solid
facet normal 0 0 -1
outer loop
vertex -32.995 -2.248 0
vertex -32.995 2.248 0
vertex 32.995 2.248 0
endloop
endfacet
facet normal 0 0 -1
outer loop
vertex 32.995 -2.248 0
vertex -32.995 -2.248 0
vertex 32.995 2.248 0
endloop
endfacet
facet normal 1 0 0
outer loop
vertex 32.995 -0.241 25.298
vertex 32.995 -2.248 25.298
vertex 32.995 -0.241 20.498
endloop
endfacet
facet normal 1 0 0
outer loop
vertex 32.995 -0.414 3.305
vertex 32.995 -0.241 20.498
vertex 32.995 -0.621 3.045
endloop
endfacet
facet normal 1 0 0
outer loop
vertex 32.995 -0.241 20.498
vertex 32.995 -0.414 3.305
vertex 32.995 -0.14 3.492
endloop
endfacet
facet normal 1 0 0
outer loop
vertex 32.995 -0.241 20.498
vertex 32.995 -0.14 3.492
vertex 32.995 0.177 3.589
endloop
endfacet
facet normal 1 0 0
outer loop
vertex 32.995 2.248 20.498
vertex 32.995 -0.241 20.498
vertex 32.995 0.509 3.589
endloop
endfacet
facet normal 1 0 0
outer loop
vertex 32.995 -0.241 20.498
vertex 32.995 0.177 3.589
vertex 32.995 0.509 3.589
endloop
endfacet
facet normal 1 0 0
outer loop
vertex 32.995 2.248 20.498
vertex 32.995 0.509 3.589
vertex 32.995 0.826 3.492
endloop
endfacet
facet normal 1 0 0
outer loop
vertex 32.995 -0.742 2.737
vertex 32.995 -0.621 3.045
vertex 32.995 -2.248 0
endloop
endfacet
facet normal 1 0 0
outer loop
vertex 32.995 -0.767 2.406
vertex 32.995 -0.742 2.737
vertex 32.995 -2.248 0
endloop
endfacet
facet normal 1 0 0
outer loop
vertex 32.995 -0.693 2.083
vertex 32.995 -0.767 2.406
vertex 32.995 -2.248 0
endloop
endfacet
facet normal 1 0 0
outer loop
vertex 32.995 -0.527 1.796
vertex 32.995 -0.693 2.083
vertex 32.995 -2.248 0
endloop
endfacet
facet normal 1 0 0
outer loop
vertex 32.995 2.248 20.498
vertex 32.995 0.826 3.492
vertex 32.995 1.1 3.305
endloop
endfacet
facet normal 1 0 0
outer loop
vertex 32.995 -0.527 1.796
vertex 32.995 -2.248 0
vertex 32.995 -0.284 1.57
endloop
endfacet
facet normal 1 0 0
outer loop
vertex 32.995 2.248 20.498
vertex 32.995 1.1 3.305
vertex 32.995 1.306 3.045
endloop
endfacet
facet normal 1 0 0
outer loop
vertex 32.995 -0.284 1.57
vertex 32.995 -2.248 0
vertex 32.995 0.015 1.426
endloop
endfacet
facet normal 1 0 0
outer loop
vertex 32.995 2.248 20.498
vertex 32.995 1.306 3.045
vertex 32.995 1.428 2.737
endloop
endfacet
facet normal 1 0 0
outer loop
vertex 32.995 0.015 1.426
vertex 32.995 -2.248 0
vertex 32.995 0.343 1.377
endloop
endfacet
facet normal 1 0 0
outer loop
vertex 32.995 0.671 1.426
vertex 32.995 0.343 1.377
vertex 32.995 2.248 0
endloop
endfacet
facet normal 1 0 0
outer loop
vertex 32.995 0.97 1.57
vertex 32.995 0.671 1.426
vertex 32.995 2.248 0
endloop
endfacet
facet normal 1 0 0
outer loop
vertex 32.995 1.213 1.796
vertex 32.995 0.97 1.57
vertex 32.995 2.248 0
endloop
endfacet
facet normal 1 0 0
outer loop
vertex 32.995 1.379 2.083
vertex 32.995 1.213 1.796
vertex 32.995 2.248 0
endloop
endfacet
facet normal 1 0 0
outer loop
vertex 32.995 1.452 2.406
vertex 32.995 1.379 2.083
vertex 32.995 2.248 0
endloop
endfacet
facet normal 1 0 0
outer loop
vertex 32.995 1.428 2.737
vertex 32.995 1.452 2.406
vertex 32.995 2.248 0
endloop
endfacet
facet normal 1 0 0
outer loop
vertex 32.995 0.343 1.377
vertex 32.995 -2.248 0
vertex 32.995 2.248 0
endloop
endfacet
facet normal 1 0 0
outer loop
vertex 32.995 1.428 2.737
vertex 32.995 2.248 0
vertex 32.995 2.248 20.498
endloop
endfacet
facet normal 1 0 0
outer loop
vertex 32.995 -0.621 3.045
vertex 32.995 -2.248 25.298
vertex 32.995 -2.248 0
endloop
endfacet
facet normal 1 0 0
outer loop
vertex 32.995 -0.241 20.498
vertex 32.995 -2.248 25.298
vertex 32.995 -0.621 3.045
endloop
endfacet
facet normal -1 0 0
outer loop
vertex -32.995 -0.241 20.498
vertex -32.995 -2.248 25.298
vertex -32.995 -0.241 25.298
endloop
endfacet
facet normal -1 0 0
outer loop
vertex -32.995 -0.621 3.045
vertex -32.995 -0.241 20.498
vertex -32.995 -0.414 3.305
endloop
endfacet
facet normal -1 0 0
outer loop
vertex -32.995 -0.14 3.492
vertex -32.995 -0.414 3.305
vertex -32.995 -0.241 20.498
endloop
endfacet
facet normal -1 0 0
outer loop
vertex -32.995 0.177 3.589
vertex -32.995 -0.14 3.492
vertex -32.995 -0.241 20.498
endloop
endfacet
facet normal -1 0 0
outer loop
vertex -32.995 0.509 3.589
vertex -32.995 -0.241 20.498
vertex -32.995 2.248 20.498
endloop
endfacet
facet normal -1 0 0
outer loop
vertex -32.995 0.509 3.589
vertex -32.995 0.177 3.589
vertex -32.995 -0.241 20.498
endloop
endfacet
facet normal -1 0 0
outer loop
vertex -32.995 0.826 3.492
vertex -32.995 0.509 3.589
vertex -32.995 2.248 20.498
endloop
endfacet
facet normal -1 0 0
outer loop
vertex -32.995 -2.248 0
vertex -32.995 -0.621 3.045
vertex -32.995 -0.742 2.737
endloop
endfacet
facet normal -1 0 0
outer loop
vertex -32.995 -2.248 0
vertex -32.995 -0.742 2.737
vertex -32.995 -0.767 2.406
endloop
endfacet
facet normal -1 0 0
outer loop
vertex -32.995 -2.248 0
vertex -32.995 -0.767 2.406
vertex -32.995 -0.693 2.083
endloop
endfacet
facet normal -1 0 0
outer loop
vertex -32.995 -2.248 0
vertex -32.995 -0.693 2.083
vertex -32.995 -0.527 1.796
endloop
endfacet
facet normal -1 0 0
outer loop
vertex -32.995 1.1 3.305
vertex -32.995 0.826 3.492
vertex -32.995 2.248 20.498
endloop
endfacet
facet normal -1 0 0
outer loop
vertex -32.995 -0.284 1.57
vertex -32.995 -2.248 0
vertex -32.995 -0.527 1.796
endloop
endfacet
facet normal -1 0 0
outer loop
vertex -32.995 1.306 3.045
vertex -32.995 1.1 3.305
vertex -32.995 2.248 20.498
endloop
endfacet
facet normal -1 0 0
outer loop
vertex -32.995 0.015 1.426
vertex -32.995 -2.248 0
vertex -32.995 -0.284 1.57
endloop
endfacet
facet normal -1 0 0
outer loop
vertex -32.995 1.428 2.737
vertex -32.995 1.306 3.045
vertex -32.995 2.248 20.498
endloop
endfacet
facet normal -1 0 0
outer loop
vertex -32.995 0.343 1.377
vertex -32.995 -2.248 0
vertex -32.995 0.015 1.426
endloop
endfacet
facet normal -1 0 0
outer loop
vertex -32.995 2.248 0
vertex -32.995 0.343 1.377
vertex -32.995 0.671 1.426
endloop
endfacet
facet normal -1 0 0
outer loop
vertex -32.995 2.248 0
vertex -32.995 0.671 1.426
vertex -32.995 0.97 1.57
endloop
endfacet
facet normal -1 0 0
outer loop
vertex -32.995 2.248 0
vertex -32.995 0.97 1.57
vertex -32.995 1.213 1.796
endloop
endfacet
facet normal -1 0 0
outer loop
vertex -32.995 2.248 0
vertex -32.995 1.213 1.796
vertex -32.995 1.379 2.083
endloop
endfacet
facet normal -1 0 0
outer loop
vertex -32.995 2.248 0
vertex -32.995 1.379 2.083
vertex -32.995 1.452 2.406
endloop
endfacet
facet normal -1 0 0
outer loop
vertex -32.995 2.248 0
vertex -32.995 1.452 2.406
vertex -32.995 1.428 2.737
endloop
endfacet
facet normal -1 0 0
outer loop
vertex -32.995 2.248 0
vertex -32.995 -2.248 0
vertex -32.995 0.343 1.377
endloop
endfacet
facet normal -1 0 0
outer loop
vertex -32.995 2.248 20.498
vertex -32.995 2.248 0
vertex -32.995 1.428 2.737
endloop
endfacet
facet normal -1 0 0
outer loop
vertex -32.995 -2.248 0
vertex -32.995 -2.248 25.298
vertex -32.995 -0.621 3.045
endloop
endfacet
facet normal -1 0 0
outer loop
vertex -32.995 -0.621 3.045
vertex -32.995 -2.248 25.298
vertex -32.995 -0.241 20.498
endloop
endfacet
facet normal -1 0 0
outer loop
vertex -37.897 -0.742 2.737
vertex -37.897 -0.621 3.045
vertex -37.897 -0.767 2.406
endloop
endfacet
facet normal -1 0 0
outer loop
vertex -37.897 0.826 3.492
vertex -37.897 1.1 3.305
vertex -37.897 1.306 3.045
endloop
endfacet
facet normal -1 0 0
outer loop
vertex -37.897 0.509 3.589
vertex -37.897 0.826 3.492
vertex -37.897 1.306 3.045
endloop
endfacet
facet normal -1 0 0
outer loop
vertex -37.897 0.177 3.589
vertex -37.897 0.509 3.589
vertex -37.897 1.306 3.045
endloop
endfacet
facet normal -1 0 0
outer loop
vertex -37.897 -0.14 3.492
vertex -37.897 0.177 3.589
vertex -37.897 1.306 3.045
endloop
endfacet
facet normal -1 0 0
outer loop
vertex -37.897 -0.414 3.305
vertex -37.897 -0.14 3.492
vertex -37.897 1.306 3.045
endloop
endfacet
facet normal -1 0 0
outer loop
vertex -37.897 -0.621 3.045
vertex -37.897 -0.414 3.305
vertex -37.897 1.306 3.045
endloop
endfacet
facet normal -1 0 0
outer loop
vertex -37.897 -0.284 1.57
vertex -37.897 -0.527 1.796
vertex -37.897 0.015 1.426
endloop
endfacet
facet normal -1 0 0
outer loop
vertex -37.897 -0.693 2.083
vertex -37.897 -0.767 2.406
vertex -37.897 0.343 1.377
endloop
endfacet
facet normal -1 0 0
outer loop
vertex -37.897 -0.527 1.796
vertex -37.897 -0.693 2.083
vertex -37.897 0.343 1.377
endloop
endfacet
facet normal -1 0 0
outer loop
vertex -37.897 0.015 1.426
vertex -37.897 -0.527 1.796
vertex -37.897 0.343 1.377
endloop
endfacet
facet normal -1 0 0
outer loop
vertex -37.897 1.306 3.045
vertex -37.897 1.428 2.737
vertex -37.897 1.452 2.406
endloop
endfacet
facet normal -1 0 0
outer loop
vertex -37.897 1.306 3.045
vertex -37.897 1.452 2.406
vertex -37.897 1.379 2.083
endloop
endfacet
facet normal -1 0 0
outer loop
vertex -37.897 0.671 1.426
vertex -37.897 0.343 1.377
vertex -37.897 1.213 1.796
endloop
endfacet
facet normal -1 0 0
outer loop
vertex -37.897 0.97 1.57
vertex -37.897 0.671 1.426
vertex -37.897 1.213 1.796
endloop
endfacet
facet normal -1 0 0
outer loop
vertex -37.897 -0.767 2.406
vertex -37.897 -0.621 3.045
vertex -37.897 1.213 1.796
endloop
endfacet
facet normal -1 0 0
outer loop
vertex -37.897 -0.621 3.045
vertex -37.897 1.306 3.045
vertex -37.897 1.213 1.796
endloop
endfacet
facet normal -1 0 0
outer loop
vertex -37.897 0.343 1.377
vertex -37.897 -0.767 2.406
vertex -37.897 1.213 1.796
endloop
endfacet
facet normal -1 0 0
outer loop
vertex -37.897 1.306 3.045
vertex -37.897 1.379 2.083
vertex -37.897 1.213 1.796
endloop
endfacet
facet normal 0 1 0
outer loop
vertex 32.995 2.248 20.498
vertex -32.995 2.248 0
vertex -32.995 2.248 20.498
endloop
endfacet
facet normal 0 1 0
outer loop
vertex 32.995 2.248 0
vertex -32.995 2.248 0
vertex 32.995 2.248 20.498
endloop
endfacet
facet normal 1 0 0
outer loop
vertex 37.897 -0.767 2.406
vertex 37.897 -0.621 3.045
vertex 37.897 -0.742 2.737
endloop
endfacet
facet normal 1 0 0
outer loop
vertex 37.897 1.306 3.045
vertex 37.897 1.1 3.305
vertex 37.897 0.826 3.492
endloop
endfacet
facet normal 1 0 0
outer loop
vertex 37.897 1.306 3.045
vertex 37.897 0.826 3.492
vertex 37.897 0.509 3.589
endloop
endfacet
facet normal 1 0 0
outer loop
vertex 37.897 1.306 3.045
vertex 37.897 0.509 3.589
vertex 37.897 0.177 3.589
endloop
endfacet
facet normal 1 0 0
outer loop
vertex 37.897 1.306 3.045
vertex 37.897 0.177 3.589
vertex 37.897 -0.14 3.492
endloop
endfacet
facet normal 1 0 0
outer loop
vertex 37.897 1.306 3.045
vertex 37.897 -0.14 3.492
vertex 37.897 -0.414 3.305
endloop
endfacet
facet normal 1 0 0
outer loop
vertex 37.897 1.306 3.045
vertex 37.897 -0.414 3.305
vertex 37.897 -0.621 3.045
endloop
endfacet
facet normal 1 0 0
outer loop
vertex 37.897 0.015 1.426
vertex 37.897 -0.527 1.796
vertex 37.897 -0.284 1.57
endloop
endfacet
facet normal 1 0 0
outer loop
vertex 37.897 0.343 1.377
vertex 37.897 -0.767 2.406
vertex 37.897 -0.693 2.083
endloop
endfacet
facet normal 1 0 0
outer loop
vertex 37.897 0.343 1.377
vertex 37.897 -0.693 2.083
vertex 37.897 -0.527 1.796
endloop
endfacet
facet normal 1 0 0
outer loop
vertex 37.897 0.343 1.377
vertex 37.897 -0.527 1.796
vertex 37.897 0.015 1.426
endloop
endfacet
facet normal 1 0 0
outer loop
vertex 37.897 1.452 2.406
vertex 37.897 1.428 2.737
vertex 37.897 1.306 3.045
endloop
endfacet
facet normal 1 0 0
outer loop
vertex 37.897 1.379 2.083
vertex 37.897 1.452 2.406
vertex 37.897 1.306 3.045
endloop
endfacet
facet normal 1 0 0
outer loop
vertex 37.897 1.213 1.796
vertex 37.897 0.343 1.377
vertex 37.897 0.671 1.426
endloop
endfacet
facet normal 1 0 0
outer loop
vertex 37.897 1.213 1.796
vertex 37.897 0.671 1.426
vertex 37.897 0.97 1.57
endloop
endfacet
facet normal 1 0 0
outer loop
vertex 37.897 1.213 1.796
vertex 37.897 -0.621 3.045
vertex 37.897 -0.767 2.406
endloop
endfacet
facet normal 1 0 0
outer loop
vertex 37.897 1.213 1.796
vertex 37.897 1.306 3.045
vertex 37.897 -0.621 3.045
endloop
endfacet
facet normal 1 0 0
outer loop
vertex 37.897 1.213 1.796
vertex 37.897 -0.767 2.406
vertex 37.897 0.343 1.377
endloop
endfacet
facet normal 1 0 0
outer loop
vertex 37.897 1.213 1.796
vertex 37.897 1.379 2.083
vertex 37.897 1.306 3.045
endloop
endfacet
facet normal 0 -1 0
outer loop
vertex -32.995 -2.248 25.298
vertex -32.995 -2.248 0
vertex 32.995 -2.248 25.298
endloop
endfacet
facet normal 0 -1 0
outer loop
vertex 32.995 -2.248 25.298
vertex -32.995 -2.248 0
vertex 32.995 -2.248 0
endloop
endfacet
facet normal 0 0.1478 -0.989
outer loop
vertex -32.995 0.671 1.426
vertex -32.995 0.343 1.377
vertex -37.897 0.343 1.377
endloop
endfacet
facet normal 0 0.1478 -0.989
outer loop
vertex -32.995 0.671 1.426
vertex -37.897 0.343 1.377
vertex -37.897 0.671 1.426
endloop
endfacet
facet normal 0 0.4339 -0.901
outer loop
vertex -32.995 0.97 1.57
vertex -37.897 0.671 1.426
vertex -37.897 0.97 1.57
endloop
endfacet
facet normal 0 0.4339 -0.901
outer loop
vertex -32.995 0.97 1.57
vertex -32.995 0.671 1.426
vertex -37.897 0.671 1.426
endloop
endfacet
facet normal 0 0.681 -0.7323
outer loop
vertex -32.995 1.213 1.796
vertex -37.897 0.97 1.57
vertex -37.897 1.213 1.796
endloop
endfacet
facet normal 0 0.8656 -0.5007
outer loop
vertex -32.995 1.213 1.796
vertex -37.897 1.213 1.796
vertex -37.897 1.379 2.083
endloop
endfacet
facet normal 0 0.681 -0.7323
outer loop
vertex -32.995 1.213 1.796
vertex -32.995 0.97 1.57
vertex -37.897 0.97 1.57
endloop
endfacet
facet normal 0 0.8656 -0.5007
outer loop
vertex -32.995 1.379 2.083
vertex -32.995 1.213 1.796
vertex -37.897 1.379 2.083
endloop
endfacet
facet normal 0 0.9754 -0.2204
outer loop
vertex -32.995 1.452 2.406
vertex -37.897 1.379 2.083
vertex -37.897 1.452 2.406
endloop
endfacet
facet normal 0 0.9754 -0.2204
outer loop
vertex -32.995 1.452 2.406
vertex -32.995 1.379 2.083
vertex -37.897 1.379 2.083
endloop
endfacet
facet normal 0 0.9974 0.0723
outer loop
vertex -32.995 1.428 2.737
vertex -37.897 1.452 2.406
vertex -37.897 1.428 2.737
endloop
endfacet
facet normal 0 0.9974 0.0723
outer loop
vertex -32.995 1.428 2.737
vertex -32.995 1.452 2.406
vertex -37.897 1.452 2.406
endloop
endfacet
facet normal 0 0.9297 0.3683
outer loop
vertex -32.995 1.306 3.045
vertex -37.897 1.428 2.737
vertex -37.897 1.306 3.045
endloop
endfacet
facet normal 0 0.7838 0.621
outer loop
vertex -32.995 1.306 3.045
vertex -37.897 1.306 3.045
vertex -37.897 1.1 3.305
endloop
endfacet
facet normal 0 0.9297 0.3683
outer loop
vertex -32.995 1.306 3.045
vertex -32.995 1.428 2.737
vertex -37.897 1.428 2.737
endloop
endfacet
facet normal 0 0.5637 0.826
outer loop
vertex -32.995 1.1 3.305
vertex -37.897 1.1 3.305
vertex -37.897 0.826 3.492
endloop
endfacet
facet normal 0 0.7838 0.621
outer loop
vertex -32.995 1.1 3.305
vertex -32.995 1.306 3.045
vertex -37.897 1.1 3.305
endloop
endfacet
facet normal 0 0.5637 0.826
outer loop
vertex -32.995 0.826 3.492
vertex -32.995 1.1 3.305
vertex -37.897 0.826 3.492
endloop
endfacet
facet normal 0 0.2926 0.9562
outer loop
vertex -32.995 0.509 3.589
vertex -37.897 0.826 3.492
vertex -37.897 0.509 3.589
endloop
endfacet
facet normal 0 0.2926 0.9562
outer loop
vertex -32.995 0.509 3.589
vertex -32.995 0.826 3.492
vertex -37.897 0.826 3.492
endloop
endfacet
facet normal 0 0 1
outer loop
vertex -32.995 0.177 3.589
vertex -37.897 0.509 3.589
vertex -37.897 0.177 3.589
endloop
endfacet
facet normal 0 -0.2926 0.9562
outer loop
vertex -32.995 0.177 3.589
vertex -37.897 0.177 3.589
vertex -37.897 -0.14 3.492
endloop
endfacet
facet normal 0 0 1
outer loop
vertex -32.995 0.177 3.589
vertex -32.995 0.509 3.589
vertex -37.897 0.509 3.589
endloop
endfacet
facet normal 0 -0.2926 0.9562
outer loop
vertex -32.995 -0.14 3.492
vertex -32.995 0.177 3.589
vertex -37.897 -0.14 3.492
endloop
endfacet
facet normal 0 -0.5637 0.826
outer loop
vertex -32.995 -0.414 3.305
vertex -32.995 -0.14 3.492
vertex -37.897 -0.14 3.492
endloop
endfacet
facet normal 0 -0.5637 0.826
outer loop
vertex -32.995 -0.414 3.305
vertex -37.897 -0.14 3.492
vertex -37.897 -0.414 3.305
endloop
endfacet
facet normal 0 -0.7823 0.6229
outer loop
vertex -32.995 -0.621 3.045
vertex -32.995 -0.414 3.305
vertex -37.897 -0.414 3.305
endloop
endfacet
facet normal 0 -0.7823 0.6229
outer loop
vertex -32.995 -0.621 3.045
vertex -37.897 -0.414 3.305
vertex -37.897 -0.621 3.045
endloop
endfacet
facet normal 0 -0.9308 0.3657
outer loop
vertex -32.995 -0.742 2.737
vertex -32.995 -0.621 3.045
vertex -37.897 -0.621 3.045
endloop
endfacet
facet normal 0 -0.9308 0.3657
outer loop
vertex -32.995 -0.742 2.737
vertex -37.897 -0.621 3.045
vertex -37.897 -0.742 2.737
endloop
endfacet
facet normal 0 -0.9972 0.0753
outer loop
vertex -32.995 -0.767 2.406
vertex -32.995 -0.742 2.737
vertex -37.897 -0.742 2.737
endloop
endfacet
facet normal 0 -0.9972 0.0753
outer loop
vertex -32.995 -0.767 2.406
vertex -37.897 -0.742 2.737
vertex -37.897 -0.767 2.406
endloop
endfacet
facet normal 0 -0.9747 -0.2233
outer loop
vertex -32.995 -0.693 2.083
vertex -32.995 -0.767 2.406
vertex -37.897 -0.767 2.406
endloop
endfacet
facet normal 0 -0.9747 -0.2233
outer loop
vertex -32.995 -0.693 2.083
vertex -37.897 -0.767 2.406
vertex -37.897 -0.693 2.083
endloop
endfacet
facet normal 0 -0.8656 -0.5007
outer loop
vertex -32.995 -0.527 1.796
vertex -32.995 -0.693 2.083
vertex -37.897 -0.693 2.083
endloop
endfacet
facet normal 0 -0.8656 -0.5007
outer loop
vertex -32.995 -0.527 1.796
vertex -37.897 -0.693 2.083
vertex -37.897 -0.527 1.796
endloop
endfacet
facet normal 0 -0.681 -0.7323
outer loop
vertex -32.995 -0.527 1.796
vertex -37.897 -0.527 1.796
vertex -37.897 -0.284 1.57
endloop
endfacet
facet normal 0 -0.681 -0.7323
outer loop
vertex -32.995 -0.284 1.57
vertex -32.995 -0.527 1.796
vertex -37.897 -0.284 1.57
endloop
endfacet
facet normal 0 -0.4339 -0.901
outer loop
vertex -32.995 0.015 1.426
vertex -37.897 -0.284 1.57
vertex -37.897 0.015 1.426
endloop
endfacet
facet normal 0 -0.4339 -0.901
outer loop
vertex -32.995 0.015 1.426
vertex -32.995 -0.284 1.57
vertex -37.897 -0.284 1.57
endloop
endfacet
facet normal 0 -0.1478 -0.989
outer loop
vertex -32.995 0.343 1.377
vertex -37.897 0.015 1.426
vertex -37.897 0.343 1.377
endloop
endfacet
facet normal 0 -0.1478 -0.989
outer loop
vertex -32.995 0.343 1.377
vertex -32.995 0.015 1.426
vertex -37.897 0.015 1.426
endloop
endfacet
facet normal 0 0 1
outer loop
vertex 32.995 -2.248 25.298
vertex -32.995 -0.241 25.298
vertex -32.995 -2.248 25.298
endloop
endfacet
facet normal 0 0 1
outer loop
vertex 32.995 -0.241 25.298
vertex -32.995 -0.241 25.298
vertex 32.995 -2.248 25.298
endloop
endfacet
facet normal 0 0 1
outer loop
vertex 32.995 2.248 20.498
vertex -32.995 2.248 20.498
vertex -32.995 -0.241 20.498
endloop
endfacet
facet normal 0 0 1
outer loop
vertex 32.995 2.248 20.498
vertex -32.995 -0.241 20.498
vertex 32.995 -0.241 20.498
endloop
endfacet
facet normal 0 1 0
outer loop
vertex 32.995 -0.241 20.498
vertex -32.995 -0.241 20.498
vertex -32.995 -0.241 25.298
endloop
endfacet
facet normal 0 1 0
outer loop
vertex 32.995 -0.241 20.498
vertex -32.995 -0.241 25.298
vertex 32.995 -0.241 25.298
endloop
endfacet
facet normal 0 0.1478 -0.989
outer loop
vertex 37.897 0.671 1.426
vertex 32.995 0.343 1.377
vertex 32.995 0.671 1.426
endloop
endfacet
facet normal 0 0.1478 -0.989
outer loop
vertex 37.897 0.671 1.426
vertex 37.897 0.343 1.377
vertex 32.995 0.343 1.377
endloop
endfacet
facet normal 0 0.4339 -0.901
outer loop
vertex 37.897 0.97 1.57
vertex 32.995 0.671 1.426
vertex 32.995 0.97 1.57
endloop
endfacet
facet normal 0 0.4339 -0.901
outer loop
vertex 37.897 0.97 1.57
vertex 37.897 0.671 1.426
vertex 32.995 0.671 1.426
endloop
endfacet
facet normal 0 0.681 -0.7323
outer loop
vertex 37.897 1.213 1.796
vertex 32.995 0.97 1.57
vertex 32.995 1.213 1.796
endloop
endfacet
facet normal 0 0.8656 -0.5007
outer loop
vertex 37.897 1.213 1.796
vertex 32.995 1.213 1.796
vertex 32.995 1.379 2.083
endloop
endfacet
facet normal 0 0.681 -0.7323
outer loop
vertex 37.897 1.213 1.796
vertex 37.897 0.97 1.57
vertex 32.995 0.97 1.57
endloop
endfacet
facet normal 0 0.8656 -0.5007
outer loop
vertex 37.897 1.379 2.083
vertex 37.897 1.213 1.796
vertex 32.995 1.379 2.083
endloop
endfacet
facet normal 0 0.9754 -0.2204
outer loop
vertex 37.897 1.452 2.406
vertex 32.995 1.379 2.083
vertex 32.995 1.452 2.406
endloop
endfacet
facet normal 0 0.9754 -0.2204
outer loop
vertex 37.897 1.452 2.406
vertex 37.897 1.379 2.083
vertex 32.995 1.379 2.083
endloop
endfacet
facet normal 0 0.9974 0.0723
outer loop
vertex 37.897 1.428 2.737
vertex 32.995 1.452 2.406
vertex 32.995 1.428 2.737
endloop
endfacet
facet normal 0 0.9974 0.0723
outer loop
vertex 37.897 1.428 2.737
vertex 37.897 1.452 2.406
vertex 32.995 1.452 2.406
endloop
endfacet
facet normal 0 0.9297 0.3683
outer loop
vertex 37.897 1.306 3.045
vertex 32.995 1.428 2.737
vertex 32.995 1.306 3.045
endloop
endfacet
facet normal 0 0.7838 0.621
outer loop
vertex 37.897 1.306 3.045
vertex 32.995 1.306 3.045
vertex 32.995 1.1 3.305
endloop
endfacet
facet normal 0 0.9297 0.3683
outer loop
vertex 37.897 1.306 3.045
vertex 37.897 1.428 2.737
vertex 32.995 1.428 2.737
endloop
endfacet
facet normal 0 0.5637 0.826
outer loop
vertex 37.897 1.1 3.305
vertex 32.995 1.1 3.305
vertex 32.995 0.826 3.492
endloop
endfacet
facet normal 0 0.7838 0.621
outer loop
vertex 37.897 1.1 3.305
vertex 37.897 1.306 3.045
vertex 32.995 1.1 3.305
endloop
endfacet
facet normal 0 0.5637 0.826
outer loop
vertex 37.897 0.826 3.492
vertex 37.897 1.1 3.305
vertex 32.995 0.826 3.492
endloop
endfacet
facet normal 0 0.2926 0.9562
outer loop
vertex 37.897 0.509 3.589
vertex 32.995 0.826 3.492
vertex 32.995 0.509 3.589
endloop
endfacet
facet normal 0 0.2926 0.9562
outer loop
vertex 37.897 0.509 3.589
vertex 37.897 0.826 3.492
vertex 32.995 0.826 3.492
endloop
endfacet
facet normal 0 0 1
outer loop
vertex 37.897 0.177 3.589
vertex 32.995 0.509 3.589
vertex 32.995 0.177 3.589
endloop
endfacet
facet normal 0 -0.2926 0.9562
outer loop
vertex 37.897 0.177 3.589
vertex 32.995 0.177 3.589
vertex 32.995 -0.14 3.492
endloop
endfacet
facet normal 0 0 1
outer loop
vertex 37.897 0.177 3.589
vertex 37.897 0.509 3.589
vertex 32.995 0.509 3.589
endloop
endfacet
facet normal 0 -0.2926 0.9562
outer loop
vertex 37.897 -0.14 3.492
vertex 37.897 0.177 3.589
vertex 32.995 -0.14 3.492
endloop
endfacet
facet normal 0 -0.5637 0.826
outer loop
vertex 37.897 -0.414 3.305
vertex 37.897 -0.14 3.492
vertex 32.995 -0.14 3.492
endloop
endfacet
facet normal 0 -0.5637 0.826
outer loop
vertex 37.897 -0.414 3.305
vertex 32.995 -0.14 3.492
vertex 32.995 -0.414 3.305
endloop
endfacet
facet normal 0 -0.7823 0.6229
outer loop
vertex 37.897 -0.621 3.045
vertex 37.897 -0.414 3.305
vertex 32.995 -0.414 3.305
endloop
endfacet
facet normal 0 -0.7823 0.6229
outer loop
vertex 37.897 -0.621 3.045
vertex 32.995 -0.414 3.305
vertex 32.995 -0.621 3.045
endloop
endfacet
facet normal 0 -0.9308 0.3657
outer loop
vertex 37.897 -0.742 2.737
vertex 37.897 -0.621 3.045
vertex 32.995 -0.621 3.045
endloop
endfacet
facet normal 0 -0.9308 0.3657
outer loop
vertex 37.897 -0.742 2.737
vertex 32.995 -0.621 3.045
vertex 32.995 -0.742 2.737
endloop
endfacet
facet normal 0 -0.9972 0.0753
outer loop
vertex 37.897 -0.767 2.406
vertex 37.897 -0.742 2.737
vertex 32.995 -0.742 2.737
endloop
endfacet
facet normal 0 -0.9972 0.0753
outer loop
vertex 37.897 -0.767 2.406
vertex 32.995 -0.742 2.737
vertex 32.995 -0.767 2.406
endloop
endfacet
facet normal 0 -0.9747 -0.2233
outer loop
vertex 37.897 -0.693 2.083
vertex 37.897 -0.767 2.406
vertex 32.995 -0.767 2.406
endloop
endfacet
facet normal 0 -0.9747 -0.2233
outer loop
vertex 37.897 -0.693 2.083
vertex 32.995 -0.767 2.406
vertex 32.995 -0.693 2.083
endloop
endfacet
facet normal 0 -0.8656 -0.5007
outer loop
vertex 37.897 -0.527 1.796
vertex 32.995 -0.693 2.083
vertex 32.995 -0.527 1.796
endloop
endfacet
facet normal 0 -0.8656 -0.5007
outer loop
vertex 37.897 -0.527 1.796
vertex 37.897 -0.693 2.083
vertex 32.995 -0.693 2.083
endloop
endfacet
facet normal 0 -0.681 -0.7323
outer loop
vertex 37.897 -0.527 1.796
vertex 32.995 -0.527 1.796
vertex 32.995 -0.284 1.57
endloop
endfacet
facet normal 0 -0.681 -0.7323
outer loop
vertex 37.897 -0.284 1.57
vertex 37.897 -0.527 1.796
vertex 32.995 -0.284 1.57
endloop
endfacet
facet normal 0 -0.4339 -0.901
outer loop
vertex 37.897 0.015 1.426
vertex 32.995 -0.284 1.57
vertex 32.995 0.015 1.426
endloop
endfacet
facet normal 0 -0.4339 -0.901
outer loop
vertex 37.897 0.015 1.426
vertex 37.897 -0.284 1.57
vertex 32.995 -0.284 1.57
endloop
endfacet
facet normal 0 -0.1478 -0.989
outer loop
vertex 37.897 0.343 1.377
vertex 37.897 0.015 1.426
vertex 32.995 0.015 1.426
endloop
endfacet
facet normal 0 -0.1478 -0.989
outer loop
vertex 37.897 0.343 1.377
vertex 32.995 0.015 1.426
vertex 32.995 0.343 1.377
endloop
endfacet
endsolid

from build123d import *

# Parameters (mm, degrees)
SKETCH1_W           = 65.9892
SKETCH1_H           = 4.4958
BOSS_EXTRUDE1_DEPTH = 20.4978
SKETCH4_W           = 65.9892
SKETCH4_H           = 2.0066
BOSS_EXTRUDE2_DEPTH = 4.8006
SKETCH5_R           = 1.11252
BOSS_EXTRUDE3_DEPTH = 37.8968


with BuildPart() as part:
    # Sketch1 → Boss-Extrude1 (new body)
    with BuildSketch(Plane.XY):
        Rectangle(SKETCH1_W, SKETCH1_H)
    extrude(amount=BOSS_EXTRUDE1_DEPTH)

    # Sketch4 → Boss-Extrude2 (add)
    with BuildSketch(Plane.XY.offset(20.4978)):
        with Locations((0, -1.2446)):
            Rectangle(SKETCH4_W, SKETCH4_H)
    extrude(amount=BOSS_EXTRUDE2_DEPTH)

    # Sketch5 → Boss-Extrude3 (add, symmetric)
    with BuildSketch(Plane(origin=(0, 0, 0), x_dir=(0, 0, -1), z_dir=(1, 0, 0))):
        with Locations((-2.4892, 0.3429)):
            Circle(SKETCH5_R)
    extrude(amount=BOSS_EXTRUDE3_DEPTH, both=True)


solid = part.part
